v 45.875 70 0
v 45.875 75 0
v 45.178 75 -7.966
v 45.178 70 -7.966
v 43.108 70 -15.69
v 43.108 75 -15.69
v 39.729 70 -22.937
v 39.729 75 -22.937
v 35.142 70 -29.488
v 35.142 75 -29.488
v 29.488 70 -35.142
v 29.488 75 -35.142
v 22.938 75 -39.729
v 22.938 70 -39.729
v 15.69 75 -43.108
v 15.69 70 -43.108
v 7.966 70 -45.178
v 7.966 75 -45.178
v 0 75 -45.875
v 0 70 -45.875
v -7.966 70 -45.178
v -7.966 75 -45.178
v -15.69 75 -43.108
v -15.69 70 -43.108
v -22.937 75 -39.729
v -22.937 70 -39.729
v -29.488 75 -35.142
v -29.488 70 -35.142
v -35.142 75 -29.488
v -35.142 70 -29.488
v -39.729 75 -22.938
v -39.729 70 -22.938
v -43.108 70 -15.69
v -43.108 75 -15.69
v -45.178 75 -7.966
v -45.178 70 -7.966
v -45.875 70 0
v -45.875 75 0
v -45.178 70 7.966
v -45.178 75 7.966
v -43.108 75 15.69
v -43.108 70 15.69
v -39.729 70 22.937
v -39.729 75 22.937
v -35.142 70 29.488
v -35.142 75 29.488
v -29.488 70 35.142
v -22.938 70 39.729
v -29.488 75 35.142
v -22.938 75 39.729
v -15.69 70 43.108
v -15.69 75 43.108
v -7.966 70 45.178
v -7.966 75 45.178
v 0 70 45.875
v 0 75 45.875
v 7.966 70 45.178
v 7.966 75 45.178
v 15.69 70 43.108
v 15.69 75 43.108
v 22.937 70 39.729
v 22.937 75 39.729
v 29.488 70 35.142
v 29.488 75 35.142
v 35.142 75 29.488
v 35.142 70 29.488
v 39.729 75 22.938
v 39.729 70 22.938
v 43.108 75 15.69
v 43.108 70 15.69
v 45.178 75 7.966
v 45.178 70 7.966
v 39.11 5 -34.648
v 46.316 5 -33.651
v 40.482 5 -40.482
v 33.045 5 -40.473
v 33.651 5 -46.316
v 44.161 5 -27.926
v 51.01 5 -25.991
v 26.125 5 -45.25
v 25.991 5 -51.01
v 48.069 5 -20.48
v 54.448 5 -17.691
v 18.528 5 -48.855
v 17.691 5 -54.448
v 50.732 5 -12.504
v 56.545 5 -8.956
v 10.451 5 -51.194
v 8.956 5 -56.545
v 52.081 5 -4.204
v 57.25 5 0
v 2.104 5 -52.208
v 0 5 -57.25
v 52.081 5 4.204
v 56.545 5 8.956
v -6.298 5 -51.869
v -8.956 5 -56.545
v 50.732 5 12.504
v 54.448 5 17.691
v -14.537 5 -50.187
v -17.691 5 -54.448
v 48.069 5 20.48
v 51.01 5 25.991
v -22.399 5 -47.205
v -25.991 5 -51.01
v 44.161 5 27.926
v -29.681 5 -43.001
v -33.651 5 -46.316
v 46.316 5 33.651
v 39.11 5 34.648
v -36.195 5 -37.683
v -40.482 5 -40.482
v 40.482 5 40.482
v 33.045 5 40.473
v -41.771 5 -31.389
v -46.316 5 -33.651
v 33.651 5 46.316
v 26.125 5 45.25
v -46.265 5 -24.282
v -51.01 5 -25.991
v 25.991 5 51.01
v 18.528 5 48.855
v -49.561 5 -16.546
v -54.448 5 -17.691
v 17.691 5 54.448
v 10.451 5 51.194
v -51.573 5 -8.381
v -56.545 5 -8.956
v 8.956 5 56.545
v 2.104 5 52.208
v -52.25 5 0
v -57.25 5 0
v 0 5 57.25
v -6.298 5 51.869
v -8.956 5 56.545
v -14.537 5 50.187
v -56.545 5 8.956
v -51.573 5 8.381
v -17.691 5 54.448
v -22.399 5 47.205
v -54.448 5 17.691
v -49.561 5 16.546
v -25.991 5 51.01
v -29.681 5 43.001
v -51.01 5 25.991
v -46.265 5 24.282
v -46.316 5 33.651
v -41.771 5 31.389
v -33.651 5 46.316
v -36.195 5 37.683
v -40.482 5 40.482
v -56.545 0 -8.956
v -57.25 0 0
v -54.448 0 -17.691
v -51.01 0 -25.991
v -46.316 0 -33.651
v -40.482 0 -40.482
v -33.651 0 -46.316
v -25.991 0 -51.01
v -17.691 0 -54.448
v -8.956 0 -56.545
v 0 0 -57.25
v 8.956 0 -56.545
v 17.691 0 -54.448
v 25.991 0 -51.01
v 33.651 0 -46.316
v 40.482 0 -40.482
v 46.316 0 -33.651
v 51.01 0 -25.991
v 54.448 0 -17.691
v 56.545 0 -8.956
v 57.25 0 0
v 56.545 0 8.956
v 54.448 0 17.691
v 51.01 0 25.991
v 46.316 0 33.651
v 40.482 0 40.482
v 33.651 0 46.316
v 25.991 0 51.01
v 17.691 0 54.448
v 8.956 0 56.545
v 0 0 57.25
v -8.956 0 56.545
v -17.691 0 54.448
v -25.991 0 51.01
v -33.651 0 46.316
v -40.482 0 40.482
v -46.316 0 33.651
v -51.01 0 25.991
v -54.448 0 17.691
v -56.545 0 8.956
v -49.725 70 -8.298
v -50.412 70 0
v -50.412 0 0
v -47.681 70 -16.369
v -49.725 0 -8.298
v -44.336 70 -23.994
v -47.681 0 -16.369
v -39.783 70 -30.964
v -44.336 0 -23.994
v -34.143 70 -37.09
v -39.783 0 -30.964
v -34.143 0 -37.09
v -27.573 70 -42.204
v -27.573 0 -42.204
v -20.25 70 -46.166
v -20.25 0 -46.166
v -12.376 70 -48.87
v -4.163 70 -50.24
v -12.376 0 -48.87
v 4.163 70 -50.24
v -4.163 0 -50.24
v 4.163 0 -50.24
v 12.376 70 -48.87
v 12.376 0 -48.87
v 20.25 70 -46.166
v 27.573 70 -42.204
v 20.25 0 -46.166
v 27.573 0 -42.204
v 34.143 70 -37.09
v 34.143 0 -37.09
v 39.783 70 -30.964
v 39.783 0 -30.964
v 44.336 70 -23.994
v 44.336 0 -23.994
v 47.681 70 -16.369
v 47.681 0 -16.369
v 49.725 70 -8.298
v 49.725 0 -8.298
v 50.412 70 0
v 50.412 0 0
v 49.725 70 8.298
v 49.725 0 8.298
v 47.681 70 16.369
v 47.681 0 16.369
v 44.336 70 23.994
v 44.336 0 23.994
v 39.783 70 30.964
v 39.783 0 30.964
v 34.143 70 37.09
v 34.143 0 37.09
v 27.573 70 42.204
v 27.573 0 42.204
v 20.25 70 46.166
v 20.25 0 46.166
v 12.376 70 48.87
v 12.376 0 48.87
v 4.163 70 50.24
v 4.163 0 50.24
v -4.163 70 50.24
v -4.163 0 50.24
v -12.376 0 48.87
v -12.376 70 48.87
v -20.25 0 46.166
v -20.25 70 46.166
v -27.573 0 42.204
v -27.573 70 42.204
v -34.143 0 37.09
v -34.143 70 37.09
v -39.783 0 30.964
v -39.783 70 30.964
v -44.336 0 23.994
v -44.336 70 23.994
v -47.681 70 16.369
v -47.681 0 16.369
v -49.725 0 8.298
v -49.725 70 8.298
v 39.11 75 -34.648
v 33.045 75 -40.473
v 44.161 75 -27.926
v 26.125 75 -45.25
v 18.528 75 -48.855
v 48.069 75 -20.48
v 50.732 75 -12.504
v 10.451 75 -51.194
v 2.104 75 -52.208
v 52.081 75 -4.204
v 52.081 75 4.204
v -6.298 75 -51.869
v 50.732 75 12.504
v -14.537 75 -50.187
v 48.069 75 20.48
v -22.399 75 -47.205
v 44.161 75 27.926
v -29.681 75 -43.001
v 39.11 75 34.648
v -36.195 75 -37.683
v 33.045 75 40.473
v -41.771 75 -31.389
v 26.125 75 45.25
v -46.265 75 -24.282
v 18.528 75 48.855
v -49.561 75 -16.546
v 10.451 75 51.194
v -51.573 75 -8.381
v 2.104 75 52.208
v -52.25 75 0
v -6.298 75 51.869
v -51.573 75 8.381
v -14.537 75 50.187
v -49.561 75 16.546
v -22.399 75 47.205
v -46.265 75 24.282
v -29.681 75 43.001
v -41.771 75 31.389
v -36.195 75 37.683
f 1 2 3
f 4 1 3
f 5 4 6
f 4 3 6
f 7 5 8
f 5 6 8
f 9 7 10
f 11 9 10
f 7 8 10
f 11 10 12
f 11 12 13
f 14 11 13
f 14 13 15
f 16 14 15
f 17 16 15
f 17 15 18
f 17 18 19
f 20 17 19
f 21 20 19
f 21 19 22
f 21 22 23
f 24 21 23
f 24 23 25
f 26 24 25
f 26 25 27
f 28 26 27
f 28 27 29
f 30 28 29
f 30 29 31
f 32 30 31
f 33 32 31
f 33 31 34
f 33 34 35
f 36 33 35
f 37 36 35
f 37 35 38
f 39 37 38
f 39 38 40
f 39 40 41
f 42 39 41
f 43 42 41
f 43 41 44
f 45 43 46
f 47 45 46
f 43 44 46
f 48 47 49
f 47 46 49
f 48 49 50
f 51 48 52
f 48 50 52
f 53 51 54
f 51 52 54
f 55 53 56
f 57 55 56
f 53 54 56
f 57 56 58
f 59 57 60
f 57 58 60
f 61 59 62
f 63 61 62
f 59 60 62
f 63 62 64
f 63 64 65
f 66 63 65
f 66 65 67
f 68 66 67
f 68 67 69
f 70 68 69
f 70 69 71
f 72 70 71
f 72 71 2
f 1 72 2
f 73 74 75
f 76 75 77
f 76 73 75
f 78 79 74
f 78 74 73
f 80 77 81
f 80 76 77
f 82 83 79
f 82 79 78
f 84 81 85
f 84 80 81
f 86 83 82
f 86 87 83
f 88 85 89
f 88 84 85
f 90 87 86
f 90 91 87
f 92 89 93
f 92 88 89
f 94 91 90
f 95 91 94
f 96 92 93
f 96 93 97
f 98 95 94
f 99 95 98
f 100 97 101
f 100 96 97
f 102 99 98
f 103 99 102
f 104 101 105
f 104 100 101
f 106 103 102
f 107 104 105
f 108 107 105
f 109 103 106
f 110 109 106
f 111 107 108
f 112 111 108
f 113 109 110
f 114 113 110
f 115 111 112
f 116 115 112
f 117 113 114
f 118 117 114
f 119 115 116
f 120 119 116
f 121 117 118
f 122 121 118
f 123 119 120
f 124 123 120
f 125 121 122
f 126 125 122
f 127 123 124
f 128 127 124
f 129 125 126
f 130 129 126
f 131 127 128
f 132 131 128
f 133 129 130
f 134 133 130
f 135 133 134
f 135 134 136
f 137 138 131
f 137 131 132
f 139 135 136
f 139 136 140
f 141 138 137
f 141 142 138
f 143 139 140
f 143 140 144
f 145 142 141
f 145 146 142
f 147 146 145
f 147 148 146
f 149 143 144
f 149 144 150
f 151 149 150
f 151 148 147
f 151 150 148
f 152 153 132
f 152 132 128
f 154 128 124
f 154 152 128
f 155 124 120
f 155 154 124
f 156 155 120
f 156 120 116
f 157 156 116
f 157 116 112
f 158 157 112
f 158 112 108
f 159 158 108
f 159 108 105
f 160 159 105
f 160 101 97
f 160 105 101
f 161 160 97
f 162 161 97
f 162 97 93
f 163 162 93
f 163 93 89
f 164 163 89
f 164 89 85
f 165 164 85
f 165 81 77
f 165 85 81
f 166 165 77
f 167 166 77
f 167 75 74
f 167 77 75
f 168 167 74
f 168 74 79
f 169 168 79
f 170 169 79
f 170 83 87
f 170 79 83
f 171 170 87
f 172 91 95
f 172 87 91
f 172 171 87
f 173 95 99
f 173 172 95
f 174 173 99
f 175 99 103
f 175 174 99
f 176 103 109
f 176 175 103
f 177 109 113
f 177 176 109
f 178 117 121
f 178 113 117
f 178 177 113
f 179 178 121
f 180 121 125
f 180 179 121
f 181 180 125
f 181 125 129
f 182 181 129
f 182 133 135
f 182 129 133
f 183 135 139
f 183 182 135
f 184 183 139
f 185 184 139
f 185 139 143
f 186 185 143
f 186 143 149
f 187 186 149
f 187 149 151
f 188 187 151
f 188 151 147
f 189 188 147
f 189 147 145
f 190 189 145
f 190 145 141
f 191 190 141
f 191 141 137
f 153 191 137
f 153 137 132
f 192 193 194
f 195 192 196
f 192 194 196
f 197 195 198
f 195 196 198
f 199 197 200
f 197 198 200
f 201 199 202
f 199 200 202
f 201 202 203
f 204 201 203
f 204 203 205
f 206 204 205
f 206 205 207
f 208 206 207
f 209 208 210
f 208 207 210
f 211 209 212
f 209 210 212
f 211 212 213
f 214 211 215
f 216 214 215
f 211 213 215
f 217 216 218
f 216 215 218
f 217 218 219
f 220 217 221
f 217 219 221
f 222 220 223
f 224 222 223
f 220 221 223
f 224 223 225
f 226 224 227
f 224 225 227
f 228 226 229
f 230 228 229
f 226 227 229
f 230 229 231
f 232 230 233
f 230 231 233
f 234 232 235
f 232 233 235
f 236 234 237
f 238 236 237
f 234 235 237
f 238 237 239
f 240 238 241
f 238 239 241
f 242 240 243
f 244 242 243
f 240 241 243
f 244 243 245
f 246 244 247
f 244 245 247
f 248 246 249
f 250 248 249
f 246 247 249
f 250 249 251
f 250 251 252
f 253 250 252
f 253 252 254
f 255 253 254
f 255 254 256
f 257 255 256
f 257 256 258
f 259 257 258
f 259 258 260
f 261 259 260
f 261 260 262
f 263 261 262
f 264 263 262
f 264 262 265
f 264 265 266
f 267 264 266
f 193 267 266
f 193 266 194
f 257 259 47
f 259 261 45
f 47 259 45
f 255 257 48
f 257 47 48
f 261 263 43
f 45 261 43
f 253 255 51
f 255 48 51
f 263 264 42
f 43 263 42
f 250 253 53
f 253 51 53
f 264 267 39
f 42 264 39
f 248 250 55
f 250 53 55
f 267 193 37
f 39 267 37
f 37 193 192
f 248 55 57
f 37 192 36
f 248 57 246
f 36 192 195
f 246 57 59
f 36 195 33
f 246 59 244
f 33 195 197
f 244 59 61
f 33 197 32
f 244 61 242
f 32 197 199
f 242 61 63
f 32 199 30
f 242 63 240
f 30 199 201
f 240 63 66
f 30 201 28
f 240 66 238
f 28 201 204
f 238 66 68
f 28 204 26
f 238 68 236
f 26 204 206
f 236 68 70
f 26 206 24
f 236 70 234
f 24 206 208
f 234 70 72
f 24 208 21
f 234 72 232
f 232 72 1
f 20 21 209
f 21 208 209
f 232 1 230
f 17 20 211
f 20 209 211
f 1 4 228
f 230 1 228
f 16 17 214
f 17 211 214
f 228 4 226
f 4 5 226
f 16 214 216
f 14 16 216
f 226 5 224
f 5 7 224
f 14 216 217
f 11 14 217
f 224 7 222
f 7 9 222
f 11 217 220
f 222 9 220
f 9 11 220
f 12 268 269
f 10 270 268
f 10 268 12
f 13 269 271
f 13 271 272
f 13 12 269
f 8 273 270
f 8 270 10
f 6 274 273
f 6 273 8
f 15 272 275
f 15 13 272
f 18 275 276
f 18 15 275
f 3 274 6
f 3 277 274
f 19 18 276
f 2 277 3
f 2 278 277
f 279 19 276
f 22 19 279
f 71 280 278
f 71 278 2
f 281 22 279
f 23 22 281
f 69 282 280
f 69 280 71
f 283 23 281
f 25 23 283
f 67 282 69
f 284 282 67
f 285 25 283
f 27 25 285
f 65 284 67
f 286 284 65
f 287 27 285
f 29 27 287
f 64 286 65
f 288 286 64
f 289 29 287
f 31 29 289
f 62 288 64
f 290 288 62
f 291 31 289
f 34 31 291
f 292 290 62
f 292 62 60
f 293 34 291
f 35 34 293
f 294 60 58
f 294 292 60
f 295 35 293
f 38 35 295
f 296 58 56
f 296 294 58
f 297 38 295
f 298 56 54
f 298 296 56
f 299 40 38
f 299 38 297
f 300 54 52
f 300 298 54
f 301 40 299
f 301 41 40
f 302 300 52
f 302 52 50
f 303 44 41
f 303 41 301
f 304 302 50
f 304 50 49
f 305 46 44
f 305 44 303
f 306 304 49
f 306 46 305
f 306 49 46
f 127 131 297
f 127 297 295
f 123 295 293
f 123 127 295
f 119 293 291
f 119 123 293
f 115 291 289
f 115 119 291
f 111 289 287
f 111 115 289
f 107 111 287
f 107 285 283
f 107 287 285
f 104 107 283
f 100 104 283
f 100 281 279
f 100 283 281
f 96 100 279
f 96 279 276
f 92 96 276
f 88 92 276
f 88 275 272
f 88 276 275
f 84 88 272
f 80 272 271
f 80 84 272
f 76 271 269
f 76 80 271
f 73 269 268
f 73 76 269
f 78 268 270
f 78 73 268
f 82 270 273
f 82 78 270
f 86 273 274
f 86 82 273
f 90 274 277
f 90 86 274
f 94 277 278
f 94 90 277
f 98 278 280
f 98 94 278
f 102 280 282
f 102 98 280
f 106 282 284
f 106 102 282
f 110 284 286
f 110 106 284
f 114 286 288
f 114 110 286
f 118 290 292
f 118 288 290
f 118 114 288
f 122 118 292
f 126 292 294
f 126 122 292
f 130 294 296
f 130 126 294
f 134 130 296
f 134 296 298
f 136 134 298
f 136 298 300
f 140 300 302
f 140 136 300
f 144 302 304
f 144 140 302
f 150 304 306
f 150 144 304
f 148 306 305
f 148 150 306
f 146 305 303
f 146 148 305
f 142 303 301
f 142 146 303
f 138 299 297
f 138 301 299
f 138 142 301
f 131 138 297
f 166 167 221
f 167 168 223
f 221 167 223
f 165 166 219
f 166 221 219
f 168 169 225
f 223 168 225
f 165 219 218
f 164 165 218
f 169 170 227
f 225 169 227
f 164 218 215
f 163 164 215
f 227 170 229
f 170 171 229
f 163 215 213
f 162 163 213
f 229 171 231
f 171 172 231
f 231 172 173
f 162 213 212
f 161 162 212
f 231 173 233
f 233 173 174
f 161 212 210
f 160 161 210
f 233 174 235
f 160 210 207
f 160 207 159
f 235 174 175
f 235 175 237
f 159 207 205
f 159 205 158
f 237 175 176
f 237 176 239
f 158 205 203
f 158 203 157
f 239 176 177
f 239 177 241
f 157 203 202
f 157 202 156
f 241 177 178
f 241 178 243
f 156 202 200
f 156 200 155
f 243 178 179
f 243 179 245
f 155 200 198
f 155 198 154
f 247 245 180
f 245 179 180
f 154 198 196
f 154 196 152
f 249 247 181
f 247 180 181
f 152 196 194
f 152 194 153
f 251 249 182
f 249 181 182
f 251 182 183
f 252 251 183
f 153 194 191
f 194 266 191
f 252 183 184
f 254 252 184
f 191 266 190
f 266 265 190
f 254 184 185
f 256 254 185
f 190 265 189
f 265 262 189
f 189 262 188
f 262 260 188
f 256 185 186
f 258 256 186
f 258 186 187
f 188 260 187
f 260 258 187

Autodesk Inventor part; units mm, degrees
ref_plane "YZ Plane" through (0, 0, 0) normal (1, 0, 0) x (0, 1, 0)
ref_plane "XZ Plane" through (0, 0, 0) normal (0, 1, 0) x (-1, 0, 0)
sketch "Sketch1" plane through (0, 0, 0) normal (0, 1, 0) x (-1, 0, 0)
  circle A0 centre (0, 0) radius 57.25
  circle A1 centre (0, 0) radius 52.25
  circle A2 centre (0, 0) radius 50.4125
  circle A3 centre (0, 0) radius 9.5
  dimension "Absolute_Diameter" = 114.5
  dimension "Diameter_No_Outer_Lip" = 104.5
  dimension "Inner_Cylinder_Diameter" = 100.825
  dimension "Lip_Diameter" = 19
extrude "Extrusion1" add sketch "Sketch1" along normal blind 5 contours A0
extrude "Extrusion2" add sketch "Sketch1" along normal blind 75 contours A1
sketch "Sketch2" plane through (0, 75, 0) normal (0, 1, 0) x (1, 0, 0)
  circle A0 centre (0, 0) radius 52.25
  circle A1 centre (0, 0) radius 45.875
  dimension "Lip_Diameter_Out" = 104.5
  dimension "Inner_Lip_Diameter" = 91.75
extrude "Extrusion7" add sketch "Sketch2" against normal blind 5
ref_plane "Work Plane2" through (0, 10, 0) normal (0, 1, 0) x (1, 0, 0)
sketch "Sketch3" plane through (0, 10, 0) normal (0, 1, 0) x (1, 0, 0)
  circle A0 centre (0, 0) radius 127.5
  circle A1 centre (0, 127.5) radius 2.75
  circle A2 centre (-74.9426, 103.1497) radius 2.75
  circle A3 centre (-121.2597, 39.3997) radius 2.75
  circle A4 centre (-121.2597, -39.3997) radius 2.75
  circle A5 centre (-74.9426, -103.1497) radius 2.75
  circle A6 centre (0, -127.5) radius 2.75
  circle A7 centre (74.9426, -103.1497) radius 2.75
  circle A8 centre (121.2597, -39.3997) radius 2.75
  circle A9 centre (121.2597, 39.3997) radius 2.75
  circle A10 centre (74.9426, 103.1497) radius 2.75
  dimension "d27" = 255
  dimension "d229" = 5.5
  dimension "d232" = 360
extrude "Extrusion8" [suppressed]
sketch "Sketch24" plane through (0, 0, 0) normal (0, -1, 0) x (1, 0, 0)
  circle A0 centre (0, 0) radius 112.0375
  arc A1 (-85.157, -104.7535) -> (32.5, -131.0296) centre (0, 0) ccw
  circle A2 centre (0, 0) radius 133
  line L0 (-32.5, -70.125) -> (32.5, -70.125)
  line L1 (32.5, -70.125) -> (32.5, -160.125)
  line L2 (32.5, -160.125) -> (-32.5, -160.125)
  line L3 (-32.5, -160.125) -> (-32.5, -70.125)
  line L4 (-31, -158.625) -> (31, -158.625)
  line L5 (31, -158.625) -> (31, -71.625)
  line L6 (31, -71.625) -> (-31, -71.625)
  line L7 (-31, -71.625) -> (-31, -158.625)
  line L8 (-85.157, -65.125) -> (-46.3, -65.125)
  line L9 (-46.3, -65.125) -> (-46.3, -151.2985)
  line L10 (-46.3, -151.2985) -> (-85.157, -151.2985)
  line L11 (-85.157, -151.2985) -> (-85.157, -65.125)
  arc A3 (32.5, -131.0296) -> (-85.157, -104.7535) centre (0, 0) ccw
  line L12 (0, -71.625) -> (0, -158.625)
  line L13 (-83.157, -149.2985) -> (-48.3, -149.2985)
  line L14 (-48.3, -149.2985) -> (-48.3, -67.125)
  line L15 (-48.3, -67.125) -> (-83.157, -67.125)
  line L16 (-83.157, -67.125) -> (-83.157, -149.2985)
  line L17 (85.157, -65.125) -> (46.3, -65.125)
  line L18 (46.3, -65.125) -> (46.3, -151.2985)
  line L19 (46.3, -151.2985) -> (85.157, -151.2985)
  line L20 (85.157, -151.2985) -> (85.157, -65.125)
  line L21 (83.157, -149.2985) -> (48.3, -149.2985)
  line L22 (48.3, -149.2985) -> (48.3, -67.125)
  line L23 (48.3, -67.125) -> (83.157, -67.125)
  line L24 (83.157, -67.125) -> (83.157, -149.2985)
  circle A4 centre (0, 0) radius 120
  point P0 (0, -135)
  point P1 (48.3, -126.0639)
  point P2 (83.157, -106.3481)
  point P3 (-31, -131.3925)
  point P4 (31, -131.3925)
  point P5 (-83.157, -106.3481)
  point P6 (-48.3, -126.0639)
  point P7 (46.3, -126.8121)
  point P8 (85.157, -104.7535)
  point P9 (-32.5, -131.0296)
  point P10 (-46.3, -126.8121)
  point P11 (48.3, -109.8504)
  point P12 (48.3, -101.0916)
  point P13 (31, -107.6634)
  point P14 (31, -115.9267)
  point P15 (-48.3, -109.8504)
  point P16 (-31, -115.9267)
  point P17 (-31, -107.6634)
  point P18 (-48.3, -101.0916)
  dimension "d234" = 2
  dimension "d235" = 65
  dimension "d237" = 1.5
  dimension "d238" = 11.113
  dimension "d240" = 20.9625
  dimension "d241" = 270
  dimension "d242" = 90
  dimension "d243" = 153.238
  dimension "d244" = 228.338
  dimension "d247" = 2
  dimension "d248" = 129.75
  dimension "d253" = 240
extrude "Extrusion30" [suppressed]
extrude "Extrusion31" [suppressed]
extrude "Extrusion32" [suppressed]
fillet "Fillet14" [suppressed]
fillet "Fillet15" [suppressed]
fillet "Fillet16" [suppressed]
fillet "Fillet17" [suppressed]
fillet "Fillet18" [suppressed]
sketch "Sketch25" plane through (0, 70, 0) normal (0, -1, 0) x (1, 0, 0)
  circle A0 centre (0, 0) radius 112.0375
  circle A1 centre (0, 0) radius 115
extrude "Extrusion33" [suppressed]
properties part number "Cylinder  Segment - 10"
